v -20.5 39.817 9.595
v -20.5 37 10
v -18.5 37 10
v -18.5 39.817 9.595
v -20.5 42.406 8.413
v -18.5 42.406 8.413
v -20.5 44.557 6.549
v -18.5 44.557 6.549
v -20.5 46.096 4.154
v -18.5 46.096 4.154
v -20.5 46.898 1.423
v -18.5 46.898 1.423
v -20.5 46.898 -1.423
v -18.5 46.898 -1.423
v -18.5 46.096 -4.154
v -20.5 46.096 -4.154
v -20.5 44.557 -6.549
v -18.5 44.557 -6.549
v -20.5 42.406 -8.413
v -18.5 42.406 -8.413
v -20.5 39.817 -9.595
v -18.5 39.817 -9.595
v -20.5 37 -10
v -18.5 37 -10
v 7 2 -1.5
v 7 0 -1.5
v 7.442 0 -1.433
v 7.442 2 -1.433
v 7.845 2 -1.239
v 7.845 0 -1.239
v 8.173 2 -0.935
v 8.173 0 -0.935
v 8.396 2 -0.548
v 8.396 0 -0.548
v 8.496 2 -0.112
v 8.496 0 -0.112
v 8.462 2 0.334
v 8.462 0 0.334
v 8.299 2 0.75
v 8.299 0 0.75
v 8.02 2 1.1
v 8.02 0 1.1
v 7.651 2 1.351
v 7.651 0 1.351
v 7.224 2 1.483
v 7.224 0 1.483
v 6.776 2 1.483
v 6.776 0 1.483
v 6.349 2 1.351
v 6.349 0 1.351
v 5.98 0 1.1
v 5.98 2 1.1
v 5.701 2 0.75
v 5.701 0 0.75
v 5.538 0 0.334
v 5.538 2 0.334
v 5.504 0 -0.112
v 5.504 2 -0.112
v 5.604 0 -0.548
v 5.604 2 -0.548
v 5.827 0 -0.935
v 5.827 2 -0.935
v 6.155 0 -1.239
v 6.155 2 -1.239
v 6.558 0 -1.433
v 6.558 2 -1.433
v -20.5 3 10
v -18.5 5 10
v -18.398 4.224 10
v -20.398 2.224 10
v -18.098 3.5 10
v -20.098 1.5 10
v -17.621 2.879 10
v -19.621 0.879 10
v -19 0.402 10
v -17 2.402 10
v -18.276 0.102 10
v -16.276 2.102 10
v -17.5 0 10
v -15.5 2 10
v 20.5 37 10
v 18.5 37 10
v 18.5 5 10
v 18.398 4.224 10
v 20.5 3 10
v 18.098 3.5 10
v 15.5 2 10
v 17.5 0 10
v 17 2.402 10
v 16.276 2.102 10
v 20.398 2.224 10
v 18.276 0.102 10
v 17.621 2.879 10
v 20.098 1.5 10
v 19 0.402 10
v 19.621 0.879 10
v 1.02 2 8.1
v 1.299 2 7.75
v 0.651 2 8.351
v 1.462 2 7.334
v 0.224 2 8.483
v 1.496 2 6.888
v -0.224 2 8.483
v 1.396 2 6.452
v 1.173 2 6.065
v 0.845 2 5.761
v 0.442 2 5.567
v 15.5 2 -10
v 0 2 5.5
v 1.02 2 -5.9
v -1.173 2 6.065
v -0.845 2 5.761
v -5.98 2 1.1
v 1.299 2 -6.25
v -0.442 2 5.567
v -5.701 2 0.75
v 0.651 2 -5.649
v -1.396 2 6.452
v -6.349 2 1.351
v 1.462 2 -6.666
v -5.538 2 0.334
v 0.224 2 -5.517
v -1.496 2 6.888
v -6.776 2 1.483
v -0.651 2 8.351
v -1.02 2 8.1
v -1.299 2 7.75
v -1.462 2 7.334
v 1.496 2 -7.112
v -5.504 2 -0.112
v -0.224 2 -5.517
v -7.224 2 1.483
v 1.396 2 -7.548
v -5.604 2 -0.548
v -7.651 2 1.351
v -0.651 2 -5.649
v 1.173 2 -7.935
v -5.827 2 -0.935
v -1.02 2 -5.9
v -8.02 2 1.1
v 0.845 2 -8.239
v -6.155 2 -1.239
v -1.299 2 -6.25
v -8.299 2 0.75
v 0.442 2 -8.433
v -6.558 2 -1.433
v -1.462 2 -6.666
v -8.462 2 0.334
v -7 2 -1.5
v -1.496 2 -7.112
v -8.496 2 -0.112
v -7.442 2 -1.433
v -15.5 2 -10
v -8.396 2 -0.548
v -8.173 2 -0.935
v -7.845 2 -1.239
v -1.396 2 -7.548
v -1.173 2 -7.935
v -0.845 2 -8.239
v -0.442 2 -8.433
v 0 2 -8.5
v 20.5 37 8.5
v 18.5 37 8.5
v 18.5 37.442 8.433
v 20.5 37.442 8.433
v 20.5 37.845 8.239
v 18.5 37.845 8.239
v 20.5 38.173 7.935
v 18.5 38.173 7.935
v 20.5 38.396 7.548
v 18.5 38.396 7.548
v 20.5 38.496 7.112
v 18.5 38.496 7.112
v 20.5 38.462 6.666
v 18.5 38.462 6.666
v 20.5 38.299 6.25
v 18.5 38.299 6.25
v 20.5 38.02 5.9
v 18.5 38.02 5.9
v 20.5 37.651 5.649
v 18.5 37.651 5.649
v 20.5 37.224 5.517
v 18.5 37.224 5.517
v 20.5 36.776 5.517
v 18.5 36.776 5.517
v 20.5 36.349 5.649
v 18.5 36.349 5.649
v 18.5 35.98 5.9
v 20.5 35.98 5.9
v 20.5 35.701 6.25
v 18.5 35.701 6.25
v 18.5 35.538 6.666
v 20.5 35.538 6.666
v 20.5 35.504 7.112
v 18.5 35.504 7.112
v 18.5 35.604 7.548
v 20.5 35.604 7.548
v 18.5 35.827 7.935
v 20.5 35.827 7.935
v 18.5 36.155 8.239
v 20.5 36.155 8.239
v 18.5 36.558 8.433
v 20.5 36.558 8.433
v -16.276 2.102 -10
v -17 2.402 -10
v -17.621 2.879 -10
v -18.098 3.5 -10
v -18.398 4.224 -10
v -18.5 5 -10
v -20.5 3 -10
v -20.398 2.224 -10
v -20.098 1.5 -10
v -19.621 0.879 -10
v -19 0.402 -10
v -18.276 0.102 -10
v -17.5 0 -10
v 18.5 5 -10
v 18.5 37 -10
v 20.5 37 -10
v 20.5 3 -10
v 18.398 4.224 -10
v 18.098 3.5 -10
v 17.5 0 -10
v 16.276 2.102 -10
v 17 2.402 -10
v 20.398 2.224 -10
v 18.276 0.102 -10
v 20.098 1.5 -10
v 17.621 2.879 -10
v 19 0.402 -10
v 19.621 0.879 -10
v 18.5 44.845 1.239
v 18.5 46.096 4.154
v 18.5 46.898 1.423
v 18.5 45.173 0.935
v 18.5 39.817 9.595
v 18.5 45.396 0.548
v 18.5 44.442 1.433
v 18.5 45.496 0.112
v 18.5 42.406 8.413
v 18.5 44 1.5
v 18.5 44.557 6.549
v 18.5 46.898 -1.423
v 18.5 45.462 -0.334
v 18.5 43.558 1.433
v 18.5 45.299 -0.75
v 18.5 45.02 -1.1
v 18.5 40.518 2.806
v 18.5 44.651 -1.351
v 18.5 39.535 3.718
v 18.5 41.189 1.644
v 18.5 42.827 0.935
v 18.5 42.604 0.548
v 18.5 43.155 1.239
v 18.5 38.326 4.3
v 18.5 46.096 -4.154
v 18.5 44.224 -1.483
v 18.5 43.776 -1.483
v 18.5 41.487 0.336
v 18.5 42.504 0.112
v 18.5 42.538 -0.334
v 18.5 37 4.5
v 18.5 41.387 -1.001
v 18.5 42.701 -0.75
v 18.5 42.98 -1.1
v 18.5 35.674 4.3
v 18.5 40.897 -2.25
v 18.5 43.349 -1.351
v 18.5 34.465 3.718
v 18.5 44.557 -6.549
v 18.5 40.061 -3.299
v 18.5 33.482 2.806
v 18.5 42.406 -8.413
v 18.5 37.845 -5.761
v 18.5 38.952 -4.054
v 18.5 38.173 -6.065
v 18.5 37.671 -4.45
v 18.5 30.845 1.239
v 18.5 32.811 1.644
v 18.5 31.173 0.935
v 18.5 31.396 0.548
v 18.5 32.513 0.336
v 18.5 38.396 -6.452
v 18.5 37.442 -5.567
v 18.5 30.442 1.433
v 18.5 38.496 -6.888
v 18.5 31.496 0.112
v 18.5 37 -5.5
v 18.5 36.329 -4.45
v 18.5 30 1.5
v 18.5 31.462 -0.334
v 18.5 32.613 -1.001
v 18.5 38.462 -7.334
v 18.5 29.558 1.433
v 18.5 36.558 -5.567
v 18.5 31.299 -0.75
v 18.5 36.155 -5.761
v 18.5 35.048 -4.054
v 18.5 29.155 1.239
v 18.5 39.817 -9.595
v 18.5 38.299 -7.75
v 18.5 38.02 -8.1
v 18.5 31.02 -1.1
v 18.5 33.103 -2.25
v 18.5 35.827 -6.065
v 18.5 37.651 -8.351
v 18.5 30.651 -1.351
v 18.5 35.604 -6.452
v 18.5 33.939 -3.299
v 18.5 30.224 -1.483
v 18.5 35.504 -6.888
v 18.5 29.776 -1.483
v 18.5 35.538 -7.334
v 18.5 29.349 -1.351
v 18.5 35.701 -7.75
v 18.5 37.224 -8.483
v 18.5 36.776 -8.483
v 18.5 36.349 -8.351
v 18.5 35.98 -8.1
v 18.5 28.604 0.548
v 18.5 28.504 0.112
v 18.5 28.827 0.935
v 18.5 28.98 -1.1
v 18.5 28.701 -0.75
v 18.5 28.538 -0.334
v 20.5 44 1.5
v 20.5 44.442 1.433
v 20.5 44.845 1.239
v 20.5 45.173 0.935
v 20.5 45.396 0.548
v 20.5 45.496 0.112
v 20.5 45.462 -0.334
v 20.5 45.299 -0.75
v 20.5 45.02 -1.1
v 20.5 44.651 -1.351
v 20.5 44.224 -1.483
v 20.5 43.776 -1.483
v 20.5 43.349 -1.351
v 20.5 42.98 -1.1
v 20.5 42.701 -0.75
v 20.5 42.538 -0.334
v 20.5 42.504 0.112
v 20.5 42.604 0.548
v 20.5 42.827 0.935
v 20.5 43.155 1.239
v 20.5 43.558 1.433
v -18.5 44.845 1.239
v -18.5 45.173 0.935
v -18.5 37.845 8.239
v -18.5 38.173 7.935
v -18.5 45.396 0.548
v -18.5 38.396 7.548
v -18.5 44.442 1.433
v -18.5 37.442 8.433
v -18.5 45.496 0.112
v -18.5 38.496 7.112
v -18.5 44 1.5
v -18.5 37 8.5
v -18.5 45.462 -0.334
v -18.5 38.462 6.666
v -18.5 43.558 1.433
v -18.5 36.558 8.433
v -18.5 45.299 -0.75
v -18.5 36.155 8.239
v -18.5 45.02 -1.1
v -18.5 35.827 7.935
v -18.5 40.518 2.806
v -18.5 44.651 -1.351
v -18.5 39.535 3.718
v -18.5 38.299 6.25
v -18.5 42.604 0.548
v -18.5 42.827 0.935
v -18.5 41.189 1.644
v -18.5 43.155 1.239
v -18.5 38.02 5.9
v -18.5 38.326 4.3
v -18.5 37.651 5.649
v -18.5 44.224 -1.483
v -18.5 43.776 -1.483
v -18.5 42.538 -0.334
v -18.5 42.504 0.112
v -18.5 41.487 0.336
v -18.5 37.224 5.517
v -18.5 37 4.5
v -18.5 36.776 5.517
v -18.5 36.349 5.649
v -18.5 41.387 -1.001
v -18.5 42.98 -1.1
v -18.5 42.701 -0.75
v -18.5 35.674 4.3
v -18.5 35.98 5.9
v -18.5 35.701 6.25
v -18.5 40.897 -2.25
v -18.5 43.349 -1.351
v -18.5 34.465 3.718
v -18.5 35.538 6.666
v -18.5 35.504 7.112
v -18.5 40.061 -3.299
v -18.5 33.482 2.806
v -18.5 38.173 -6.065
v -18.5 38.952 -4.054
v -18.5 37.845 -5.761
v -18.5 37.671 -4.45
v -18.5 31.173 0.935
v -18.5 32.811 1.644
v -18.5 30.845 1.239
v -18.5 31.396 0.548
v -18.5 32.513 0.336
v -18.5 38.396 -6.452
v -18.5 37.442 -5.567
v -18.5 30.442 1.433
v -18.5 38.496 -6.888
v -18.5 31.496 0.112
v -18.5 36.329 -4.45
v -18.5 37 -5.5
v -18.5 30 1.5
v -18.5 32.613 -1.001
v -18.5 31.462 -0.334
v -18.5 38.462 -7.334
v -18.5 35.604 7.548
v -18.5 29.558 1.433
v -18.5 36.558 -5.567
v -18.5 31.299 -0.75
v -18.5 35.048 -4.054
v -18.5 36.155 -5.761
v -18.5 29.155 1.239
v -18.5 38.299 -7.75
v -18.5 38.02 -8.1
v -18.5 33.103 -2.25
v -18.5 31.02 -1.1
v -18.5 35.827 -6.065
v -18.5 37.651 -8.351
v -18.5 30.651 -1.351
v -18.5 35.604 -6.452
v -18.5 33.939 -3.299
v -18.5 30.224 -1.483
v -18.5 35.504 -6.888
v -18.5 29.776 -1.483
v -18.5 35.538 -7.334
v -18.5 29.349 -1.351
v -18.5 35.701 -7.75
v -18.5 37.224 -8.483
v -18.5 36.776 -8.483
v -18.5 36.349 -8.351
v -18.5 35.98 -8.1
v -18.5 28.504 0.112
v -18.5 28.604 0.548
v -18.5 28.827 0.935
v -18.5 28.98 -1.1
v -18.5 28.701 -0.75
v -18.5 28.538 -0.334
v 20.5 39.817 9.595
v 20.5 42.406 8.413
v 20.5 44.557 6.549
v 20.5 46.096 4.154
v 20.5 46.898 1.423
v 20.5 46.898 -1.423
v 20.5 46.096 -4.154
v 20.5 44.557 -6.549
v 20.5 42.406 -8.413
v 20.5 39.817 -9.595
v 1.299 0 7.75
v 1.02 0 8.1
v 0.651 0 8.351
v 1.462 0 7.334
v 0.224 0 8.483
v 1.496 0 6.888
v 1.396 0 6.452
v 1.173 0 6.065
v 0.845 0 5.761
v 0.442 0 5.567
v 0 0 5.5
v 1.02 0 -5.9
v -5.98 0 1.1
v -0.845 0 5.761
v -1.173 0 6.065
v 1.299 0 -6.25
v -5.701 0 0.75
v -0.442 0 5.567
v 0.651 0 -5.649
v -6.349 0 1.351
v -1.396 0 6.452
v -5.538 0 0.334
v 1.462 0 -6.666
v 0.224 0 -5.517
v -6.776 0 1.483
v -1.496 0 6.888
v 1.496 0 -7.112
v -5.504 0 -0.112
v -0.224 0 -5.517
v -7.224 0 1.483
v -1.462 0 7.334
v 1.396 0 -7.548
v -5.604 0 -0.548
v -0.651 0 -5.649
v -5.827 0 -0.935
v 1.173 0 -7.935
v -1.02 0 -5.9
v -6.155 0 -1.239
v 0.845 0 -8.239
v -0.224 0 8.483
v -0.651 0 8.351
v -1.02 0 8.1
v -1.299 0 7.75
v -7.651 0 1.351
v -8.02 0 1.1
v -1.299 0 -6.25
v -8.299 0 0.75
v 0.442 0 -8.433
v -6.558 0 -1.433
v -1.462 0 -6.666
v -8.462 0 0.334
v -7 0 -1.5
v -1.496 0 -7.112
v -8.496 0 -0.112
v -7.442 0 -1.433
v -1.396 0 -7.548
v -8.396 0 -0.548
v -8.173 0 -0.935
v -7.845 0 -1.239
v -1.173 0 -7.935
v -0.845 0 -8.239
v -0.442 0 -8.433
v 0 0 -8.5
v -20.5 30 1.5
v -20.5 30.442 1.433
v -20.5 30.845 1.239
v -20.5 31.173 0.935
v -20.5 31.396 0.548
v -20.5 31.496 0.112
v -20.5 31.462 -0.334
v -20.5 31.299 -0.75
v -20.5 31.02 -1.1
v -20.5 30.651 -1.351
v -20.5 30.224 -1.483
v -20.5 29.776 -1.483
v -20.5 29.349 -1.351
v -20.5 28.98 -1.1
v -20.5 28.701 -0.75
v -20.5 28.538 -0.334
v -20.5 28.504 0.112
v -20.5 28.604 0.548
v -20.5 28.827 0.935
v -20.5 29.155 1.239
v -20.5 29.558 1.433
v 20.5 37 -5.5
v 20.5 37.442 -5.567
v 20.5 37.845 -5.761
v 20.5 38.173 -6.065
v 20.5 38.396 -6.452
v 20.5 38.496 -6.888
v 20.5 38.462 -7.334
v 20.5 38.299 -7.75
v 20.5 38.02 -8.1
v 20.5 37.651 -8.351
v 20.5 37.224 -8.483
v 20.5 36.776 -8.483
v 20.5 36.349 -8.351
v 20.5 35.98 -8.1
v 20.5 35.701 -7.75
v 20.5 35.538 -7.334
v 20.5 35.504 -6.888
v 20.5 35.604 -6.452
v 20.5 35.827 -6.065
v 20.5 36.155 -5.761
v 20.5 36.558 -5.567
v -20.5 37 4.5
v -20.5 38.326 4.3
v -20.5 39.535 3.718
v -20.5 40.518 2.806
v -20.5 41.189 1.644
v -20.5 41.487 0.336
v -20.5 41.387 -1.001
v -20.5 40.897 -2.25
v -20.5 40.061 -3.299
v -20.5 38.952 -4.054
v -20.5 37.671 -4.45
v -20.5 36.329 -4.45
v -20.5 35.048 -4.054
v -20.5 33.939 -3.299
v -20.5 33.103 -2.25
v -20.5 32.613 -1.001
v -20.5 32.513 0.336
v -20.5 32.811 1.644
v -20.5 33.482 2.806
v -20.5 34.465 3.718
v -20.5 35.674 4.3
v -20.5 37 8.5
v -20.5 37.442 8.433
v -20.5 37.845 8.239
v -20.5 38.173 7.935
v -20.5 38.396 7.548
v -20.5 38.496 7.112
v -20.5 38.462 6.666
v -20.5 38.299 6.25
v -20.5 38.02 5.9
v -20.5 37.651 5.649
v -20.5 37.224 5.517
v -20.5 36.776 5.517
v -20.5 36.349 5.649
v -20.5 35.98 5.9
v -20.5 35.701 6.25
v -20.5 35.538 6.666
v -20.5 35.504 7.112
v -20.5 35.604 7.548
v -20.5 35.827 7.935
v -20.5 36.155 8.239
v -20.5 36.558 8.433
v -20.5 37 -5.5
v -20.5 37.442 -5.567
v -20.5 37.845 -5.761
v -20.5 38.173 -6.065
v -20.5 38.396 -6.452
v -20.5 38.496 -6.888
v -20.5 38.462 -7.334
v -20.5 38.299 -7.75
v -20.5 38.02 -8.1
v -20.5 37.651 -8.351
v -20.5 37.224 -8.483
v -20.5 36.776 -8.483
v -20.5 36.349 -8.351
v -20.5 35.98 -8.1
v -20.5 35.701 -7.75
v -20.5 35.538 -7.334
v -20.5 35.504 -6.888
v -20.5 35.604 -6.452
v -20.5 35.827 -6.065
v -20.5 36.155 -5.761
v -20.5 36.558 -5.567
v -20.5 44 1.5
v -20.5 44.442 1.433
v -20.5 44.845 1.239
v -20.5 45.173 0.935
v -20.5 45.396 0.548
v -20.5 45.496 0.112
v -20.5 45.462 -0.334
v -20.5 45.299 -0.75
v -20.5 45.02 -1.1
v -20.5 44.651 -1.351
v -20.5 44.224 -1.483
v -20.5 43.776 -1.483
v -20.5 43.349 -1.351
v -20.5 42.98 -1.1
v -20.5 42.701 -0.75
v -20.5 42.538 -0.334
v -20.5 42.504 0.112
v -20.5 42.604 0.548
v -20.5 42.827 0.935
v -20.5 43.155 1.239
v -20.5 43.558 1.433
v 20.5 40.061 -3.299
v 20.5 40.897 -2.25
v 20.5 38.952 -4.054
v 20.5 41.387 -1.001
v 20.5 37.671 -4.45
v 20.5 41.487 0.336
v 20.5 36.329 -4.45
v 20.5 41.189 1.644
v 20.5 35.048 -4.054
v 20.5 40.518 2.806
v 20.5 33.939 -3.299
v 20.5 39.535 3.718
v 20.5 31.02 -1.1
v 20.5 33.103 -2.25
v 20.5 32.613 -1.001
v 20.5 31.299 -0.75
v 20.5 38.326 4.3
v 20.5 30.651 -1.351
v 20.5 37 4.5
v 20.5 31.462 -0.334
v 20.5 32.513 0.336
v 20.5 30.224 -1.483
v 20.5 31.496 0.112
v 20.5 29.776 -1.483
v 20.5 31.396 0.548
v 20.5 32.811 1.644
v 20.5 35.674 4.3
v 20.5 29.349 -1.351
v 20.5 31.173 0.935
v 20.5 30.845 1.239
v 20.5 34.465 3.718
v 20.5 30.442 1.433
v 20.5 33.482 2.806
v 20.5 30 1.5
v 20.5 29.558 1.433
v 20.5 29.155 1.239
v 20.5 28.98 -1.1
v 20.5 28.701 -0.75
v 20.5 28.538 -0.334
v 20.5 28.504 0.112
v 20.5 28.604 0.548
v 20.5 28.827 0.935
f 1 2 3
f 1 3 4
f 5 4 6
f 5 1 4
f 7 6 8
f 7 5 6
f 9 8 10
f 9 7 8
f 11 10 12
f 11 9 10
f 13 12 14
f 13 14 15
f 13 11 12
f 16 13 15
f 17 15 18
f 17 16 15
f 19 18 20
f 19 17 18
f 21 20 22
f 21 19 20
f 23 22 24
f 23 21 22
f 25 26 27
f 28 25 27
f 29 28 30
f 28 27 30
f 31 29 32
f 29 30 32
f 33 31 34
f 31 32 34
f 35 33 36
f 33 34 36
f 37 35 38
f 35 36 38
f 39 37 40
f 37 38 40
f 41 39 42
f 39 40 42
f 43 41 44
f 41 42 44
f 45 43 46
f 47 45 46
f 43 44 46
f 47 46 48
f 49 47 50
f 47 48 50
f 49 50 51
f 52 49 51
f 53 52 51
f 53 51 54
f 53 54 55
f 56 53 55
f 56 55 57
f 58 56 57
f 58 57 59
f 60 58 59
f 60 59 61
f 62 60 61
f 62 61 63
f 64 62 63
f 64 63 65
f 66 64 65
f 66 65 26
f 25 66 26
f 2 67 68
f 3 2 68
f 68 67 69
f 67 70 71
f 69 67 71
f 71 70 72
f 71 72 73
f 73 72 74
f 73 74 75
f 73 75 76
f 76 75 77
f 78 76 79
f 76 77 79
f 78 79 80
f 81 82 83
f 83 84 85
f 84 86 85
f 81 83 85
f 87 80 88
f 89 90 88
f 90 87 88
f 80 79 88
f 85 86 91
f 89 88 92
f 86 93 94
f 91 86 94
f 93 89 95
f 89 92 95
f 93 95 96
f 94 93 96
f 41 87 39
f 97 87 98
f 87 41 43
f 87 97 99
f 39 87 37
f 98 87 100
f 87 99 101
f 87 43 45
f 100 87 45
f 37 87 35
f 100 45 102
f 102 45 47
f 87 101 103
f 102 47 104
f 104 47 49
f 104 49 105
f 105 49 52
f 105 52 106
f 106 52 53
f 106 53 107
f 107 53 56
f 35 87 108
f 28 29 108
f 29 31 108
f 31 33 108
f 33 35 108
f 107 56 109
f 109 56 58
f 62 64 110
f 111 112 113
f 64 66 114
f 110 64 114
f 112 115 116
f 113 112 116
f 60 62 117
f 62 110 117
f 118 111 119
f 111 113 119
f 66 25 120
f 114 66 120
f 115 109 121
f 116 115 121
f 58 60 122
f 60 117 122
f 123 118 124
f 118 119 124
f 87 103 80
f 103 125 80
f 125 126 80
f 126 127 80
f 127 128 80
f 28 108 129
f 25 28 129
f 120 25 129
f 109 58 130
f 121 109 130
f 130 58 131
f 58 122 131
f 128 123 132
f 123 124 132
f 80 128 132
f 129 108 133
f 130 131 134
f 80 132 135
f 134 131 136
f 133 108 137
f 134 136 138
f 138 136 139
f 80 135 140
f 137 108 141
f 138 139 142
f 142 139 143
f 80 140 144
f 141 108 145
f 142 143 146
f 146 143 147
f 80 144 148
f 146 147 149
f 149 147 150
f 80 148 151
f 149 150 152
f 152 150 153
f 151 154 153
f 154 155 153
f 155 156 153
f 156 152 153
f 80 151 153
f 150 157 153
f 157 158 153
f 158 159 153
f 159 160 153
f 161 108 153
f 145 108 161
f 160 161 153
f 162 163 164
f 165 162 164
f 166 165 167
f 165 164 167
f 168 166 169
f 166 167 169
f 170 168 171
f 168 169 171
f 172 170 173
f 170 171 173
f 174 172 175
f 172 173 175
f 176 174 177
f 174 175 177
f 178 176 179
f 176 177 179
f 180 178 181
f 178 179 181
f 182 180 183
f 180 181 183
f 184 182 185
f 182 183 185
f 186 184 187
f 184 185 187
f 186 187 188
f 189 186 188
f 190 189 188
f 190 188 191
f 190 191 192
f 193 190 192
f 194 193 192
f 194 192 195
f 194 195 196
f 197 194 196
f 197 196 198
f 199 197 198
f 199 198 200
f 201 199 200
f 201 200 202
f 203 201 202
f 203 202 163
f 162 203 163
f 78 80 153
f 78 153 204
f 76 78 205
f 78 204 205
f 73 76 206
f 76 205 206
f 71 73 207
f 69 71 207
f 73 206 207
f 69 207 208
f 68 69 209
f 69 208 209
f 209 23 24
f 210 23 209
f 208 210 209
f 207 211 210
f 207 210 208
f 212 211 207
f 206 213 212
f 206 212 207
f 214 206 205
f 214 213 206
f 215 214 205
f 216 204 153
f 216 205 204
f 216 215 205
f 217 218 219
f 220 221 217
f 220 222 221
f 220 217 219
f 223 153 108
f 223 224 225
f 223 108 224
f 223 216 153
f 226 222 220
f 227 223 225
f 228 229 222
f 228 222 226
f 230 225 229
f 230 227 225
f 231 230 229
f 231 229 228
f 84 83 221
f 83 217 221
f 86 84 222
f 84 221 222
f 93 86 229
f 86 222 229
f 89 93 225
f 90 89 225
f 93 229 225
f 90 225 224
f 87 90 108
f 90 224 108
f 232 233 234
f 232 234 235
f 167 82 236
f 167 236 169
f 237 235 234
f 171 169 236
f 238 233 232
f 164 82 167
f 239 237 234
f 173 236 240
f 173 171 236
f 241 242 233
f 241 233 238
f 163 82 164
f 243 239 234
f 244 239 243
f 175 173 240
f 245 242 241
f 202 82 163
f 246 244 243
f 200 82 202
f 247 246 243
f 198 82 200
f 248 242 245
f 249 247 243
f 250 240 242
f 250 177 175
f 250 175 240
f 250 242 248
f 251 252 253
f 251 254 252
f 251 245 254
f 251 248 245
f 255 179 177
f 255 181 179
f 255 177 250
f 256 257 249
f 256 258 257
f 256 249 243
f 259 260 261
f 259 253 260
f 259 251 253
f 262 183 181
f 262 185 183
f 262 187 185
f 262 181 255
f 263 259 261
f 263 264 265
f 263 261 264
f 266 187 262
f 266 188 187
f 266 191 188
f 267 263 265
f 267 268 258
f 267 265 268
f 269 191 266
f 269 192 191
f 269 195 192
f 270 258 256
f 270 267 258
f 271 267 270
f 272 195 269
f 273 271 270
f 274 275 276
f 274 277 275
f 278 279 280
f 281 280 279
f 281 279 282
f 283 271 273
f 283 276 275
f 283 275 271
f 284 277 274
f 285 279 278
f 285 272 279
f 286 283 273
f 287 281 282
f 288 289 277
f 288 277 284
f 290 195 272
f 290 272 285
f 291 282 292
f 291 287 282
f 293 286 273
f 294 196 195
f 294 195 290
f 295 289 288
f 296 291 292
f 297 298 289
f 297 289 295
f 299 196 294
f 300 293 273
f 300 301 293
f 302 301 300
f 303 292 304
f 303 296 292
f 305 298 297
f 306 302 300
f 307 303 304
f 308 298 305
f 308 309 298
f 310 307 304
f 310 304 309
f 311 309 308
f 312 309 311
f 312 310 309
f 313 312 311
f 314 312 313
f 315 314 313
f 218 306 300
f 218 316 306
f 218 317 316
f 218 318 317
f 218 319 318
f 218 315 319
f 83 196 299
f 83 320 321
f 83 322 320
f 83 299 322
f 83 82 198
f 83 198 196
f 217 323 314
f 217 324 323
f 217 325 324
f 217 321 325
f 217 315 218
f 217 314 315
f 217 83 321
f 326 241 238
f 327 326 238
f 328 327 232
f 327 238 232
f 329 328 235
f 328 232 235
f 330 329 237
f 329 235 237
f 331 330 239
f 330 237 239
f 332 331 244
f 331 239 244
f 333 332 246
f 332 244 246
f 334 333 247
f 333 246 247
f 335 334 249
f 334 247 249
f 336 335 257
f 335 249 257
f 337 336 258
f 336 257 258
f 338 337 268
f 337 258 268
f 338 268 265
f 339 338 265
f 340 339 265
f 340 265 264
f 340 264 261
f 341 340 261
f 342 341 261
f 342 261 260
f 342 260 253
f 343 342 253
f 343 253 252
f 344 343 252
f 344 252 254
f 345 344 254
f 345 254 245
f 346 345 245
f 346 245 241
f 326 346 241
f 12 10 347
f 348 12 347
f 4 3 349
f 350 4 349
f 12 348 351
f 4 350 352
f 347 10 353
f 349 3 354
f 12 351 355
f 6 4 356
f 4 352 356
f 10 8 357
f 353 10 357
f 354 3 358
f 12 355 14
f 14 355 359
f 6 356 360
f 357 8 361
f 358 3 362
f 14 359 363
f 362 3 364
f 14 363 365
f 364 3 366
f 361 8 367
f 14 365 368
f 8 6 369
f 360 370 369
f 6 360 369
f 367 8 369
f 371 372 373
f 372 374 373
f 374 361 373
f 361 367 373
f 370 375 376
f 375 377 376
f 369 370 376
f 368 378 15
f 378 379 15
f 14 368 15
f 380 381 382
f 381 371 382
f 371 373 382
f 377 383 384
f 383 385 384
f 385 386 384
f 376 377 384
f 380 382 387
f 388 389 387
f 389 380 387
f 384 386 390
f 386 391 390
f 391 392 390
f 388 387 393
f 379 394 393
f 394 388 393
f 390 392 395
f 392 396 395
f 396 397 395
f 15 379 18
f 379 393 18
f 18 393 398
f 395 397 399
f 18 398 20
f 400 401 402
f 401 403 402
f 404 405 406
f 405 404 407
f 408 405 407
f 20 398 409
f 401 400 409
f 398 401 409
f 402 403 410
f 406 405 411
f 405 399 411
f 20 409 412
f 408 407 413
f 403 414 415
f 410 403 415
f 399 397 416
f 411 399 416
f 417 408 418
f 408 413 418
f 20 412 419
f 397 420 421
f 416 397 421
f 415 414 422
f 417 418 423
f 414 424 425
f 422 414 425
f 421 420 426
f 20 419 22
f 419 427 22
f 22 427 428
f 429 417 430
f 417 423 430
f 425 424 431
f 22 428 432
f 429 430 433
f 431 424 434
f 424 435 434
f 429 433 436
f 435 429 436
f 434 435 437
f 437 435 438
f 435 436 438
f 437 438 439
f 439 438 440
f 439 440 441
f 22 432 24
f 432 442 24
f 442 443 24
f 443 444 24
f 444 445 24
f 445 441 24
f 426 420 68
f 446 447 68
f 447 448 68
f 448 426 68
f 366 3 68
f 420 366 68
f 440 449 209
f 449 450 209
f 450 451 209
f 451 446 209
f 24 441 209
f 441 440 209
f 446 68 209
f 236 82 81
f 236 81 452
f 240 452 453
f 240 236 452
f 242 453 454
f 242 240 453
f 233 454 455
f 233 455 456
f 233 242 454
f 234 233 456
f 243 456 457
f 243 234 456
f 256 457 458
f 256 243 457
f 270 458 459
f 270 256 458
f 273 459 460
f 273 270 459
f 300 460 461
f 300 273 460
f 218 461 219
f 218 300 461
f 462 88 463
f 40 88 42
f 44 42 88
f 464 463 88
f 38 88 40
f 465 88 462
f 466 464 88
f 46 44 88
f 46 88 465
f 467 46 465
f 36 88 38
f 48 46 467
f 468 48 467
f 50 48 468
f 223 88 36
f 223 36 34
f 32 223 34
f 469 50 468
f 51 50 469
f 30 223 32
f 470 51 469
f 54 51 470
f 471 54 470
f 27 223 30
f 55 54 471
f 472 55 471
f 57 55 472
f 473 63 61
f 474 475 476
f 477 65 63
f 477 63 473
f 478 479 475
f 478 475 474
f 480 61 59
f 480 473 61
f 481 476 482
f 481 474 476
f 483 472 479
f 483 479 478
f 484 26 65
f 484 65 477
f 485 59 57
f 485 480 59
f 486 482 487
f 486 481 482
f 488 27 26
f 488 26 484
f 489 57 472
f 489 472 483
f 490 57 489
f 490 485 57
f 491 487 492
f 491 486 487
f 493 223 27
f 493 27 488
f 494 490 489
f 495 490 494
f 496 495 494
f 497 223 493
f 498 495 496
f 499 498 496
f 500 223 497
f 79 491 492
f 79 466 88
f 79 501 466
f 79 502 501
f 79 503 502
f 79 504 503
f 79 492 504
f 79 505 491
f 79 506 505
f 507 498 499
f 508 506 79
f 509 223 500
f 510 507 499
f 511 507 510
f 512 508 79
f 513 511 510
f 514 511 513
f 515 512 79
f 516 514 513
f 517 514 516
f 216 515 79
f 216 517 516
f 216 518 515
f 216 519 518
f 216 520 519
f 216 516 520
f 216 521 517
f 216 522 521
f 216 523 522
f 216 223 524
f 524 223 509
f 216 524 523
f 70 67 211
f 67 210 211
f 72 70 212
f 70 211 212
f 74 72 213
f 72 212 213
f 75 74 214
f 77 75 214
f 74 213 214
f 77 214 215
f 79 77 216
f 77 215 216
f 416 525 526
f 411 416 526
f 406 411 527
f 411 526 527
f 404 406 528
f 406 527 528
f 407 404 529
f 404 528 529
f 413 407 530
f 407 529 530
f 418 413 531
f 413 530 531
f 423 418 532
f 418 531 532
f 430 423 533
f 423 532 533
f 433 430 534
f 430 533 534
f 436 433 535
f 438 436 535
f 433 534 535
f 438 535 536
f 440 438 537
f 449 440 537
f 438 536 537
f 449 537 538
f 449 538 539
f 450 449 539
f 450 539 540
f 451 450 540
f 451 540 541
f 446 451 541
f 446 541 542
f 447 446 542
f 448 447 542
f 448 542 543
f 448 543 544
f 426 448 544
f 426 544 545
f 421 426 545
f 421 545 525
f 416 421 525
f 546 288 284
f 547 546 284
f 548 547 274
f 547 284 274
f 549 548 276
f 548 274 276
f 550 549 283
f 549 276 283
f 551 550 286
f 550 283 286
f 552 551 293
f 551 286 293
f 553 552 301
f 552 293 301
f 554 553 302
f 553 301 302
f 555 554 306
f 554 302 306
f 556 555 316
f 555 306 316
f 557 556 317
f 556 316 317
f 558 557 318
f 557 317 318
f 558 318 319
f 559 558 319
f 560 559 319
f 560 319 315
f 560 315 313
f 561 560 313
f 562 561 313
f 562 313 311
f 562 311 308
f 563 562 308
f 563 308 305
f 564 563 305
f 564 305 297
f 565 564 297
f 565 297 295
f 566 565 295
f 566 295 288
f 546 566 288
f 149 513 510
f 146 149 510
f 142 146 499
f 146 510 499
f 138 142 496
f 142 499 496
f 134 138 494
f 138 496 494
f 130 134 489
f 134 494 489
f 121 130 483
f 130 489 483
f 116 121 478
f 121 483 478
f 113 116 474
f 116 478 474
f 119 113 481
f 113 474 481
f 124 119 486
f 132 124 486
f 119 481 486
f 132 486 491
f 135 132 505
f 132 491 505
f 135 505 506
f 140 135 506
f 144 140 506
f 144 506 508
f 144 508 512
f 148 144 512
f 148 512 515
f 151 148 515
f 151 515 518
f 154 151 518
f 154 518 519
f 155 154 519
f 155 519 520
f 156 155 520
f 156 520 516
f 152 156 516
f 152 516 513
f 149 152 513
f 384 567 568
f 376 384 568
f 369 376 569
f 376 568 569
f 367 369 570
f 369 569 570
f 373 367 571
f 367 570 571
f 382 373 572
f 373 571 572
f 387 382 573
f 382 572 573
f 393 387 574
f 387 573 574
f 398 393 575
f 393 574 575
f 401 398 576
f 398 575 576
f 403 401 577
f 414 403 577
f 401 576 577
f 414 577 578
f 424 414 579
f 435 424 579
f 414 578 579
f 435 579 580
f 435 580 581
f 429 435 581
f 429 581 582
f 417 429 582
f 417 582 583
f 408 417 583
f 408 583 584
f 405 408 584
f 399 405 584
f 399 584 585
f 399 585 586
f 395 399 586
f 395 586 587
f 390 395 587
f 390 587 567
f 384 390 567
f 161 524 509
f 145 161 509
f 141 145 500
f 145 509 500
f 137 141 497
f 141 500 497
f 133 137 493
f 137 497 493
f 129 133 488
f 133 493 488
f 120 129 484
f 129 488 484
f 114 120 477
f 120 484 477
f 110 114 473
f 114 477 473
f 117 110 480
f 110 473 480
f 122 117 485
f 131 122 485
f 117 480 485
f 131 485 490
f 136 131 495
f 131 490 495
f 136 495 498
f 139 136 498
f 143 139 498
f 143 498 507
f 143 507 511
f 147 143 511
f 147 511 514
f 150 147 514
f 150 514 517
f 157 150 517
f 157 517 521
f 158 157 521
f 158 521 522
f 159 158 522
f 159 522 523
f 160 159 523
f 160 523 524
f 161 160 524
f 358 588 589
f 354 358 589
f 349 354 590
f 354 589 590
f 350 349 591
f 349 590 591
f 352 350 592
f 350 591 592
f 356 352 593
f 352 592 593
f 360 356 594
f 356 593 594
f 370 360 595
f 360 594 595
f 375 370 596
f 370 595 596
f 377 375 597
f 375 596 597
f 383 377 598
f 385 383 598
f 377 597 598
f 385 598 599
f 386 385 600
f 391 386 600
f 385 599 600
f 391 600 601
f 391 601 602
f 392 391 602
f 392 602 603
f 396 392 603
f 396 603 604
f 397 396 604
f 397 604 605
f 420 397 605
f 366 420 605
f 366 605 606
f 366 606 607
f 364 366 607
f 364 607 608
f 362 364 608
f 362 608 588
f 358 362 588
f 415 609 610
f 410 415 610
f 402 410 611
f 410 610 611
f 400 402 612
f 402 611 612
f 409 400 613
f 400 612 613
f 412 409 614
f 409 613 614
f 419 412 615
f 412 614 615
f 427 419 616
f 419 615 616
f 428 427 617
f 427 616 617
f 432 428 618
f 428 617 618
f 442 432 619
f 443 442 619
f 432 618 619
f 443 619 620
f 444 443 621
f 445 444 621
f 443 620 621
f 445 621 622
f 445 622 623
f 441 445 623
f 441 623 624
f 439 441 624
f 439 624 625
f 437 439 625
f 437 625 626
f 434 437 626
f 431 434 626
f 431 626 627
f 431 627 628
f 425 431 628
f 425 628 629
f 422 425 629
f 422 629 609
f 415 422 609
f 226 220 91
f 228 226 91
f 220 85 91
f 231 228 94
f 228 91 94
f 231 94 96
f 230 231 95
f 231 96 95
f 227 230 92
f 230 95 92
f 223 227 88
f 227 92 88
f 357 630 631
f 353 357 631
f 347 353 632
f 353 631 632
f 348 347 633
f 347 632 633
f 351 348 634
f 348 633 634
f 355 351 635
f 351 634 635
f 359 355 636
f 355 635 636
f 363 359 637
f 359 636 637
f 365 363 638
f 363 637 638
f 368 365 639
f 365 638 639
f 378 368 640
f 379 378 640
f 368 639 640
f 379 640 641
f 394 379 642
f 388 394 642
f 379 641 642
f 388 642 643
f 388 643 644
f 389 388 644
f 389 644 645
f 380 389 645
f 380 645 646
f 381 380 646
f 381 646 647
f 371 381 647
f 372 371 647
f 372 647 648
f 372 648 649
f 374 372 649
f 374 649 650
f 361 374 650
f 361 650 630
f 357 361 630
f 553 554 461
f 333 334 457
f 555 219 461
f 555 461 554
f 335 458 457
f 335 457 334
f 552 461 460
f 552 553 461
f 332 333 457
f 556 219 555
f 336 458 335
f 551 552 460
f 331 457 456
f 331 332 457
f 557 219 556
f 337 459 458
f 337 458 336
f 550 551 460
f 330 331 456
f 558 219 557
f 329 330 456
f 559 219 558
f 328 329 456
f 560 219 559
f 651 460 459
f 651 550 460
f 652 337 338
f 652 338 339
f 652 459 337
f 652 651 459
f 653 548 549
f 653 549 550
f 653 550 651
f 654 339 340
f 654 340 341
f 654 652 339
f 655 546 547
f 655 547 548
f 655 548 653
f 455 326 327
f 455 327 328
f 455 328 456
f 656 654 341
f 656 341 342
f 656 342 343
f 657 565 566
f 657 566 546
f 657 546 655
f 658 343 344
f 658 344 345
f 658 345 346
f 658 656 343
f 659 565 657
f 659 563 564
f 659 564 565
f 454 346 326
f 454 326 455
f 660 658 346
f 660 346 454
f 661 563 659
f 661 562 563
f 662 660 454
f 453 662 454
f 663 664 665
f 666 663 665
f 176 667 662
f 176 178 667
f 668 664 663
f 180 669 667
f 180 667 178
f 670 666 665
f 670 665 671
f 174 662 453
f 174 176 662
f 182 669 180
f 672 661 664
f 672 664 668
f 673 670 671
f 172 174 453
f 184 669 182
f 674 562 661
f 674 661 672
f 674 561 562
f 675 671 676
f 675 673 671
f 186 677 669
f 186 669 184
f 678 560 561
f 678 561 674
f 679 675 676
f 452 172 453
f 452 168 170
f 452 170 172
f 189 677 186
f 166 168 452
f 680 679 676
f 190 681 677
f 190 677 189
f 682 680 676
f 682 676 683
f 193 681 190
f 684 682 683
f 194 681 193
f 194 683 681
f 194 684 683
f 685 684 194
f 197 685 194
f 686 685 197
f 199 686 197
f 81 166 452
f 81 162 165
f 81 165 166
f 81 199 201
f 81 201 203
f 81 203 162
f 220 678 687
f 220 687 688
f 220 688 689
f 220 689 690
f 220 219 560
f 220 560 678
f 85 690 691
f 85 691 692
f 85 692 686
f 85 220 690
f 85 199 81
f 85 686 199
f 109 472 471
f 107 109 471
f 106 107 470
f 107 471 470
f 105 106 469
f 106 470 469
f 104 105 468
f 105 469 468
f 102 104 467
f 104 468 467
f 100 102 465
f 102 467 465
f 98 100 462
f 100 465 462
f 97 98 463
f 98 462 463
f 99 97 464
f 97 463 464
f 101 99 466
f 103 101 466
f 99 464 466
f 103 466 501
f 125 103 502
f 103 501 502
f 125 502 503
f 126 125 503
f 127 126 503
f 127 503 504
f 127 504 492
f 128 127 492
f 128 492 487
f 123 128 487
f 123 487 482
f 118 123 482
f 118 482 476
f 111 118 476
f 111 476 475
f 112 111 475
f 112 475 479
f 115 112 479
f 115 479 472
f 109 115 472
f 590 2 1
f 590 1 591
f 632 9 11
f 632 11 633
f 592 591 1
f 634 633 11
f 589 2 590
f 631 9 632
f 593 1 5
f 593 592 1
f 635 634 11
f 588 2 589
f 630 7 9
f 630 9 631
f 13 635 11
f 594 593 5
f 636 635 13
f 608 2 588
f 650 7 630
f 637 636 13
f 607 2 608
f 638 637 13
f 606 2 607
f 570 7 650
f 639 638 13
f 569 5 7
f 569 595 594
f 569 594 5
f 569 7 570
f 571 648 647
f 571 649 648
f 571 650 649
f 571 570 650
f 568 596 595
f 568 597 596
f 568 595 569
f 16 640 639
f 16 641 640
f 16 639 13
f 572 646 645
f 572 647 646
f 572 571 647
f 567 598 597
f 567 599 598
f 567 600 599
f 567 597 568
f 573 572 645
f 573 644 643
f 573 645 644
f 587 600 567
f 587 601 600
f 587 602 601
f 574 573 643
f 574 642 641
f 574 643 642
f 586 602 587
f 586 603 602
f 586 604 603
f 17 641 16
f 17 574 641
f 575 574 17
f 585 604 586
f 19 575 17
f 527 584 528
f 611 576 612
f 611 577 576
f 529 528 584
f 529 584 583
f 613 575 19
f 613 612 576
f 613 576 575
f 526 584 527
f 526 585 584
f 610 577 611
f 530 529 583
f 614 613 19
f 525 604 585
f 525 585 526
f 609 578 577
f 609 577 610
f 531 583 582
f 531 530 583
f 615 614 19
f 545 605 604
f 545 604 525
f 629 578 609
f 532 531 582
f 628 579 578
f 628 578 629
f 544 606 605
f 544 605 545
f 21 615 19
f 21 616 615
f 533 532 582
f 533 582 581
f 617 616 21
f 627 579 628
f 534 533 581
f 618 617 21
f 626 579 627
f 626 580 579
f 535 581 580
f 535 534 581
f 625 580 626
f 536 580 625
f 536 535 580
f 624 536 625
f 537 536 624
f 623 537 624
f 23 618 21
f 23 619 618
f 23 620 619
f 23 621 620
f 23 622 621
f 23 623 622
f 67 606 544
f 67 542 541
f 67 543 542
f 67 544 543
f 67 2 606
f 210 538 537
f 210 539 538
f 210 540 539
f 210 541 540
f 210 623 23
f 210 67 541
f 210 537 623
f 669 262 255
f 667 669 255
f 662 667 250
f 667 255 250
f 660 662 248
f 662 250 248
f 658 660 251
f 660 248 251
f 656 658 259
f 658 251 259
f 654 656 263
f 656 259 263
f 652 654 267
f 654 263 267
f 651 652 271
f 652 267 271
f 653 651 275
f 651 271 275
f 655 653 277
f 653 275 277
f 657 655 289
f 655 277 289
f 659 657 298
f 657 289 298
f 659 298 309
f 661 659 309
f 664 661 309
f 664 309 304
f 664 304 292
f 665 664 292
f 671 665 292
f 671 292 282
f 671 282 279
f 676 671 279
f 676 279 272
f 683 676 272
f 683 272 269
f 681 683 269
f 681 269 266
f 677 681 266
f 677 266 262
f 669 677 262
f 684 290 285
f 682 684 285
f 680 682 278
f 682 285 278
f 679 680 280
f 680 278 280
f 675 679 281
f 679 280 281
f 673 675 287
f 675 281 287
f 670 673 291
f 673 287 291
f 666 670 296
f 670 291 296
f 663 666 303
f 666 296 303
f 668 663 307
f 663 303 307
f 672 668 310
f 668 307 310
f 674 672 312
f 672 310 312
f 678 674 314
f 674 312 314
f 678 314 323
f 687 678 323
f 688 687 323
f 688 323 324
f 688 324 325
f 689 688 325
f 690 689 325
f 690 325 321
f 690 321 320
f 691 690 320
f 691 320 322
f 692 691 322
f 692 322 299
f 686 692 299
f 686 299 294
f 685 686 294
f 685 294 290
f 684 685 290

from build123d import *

# Parameters (mm, degrees)
EXTRUDE_1_DEPTH     = 2
SKETCH_2_W          = 2
SKETCH_2_H          = 20
EXTRUDE_2_DEPTH     = 60
FILLET_1_R          = 3
SKETCH_6_R          = 4.5
SKETCH_6_R_2        = 1.5
CUT_EXTRUDE_2_DEPTH = 76
SKETCH_7_R          = 1.5
CUT_EXTRUDE_3_DEPTH = 10


with BuildPart() as part:
    # 草图1 → 凸台-拉伸1 (new body)
    with BuildSketch(Plane(origin=(0, 0, 0), x_dir=(1, 0, 0), z_dir=(0, 1, 0))):
        Polygon((-20.5, 10), (-12.5, 10), (12.5, 10), (20.5, 10), (20.5, -10), (12.5, -10), (-12.5, -10), (-20.5, -10), align=None)
    extrude(amount=EXTRUDE_1_DEPTH)

    # 草图2 → 凸台-拉伸2 (add)
    with BuildSketch(Plane(origin=(0, 2, 0), x_dir=(1, 0, 0), z_dir=(0, 1, 0))):
        with Locations((-19.5, 0)):
            Rectangle(SKETCH_2_W, SKETCH_2_H)
        with Locations((19.5, 0)):
            Rectangle(SKETCH_2_W, SKETCH_2_H)
    extrude(amount=EXTRUDE_2_DEPTH)

    # 圆角1
    fillet_1_edges = [part.edges().sort_by_distance(p)[0] for p in [
        (20.5, 0, 0),
        (-18.5, 2, 0),
        (18.5, 2, 0),
        (-20.5, 0, 0),
    ]]
    fillet(fillet_1_edges, radius=FILLET_1_R)

    # 草图6 → 切除-拉伸2 (cut, through all)
    with BuildSketch(Plane.ZY.offset(20.5)):
        with Locations((0, 37)):
            Circle(SKETCH_6_R)
        with Locations((0, 30)):
            Circle(SKETCH_6_R_2)
        with Locations((-7, 37)):
            Circle(SKETCH_6_R_2)
        with Locations((0, 44)):
            Circle(SKETCH_6_R_2)
        with Locations((7, 37)):
            Circle(SKETCH_6_R_2)
        with BuildLine():
            Line((-10, 37), (-10, 62))
            Line((-10, 62), (10, 62))
            Line((10, 62), (10, 37))
            ThreePointArc((10, 37), (0, 47), (-10, 37))
        make_face()
    extrude(amount=-CUT_EXTRUDE_2_DEPTH, mode=Mode.SUBTRACT)

    # 草图7 → 切除-拉伸3 (cut)
    with BuildSketch(Plane.XZ):
        with Locations(Location((-7, 0, 0), (0, 0, 270))):
            Circle(SKETCH_7_R)
        with Locations(Location((0, 7, 0), (0, 0, 270))):
            Circle(SKETCH_7_R)
        with Locations(Location((7, 0, 0), (0, 0, 270))):
            Circle(SKETCH_7_R)
        with Locations(Location((0, -7, 0), (0, 0, 270))):
            Circle(SKETCH_7_R)
    extrude(amount=-CUT_EXTRUDE_3_DEPTH, mode=Mode.SUBTRACT)


solid = part.part
